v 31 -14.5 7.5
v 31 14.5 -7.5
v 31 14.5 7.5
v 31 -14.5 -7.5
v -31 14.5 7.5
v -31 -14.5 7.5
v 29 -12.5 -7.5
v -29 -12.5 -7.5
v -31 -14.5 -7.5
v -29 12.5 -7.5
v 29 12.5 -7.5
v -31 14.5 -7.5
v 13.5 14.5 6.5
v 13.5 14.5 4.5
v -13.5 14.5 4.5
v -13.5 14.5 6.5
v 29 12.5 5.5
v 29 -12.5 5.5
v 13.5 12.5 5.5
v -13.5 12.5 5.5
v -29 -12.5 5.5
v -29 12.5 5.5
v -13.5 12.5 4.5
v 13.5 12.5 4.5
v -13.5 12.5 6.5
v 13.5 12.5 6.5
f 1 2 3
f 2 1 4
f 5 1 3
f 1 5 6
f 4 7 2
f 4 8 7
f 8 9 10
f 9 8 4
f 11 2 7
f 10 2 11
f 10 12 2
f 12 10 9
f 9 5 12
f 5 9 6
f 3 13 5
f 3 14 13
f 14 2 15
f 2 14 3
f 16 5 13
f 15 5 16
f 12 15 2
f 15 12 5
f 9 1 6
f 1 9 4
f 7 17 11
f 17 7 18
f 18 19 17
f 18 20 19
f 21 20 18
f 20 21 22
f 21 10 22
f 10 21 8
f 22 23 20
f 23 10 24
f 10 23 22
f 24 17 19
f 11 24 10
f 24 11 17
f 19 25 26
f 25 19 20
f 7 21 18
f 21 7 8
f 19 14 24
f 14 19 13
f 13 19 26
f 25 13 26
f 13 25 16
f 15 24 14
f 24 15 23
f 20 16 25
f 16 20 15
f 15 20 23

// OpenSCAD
// Parameters for the ESP32 DevKit enclosure
esp32_length = 58; // Length of the ESP32 DevKit
esp32_width = 25;  // Width of the ESP32 DevKit
esp32_height = 13; // Height of the ESP32 DevKit

// Parameters for the OLED display cutout
oled_length = 27;  // Length of the 0.96 inch OLED
oled_width = 15;   // Width of the 0.96 inch OLED
oled_depth = 2;    // Depth of the OLED cutout

// Wall thickness of the enclosure
wall_thickness = 2;

// Create the main enclosure
module enclosure() {
    difference() {
        // Outer box
        cube([esp32_length + 2 * wall_thickness, esp32_width + 2 * wall_thickness, esp32_height + wall_thickness], center=true);
        
        // Inner cavity for ESP32
        translate([0, 0, -wall_thickness/2])
            cube([esp32_length, esp32_width, esp32_height], center=true);
        
        // Cutout for OLED display
        translate([0, (esp32_width + oled_width) / 2, (esp32_height - oled_depth) / 2])
            cube([oled_length, oled_width, oled_depth], center=true);
    }
}

// Render the enclosure
enclosure();
